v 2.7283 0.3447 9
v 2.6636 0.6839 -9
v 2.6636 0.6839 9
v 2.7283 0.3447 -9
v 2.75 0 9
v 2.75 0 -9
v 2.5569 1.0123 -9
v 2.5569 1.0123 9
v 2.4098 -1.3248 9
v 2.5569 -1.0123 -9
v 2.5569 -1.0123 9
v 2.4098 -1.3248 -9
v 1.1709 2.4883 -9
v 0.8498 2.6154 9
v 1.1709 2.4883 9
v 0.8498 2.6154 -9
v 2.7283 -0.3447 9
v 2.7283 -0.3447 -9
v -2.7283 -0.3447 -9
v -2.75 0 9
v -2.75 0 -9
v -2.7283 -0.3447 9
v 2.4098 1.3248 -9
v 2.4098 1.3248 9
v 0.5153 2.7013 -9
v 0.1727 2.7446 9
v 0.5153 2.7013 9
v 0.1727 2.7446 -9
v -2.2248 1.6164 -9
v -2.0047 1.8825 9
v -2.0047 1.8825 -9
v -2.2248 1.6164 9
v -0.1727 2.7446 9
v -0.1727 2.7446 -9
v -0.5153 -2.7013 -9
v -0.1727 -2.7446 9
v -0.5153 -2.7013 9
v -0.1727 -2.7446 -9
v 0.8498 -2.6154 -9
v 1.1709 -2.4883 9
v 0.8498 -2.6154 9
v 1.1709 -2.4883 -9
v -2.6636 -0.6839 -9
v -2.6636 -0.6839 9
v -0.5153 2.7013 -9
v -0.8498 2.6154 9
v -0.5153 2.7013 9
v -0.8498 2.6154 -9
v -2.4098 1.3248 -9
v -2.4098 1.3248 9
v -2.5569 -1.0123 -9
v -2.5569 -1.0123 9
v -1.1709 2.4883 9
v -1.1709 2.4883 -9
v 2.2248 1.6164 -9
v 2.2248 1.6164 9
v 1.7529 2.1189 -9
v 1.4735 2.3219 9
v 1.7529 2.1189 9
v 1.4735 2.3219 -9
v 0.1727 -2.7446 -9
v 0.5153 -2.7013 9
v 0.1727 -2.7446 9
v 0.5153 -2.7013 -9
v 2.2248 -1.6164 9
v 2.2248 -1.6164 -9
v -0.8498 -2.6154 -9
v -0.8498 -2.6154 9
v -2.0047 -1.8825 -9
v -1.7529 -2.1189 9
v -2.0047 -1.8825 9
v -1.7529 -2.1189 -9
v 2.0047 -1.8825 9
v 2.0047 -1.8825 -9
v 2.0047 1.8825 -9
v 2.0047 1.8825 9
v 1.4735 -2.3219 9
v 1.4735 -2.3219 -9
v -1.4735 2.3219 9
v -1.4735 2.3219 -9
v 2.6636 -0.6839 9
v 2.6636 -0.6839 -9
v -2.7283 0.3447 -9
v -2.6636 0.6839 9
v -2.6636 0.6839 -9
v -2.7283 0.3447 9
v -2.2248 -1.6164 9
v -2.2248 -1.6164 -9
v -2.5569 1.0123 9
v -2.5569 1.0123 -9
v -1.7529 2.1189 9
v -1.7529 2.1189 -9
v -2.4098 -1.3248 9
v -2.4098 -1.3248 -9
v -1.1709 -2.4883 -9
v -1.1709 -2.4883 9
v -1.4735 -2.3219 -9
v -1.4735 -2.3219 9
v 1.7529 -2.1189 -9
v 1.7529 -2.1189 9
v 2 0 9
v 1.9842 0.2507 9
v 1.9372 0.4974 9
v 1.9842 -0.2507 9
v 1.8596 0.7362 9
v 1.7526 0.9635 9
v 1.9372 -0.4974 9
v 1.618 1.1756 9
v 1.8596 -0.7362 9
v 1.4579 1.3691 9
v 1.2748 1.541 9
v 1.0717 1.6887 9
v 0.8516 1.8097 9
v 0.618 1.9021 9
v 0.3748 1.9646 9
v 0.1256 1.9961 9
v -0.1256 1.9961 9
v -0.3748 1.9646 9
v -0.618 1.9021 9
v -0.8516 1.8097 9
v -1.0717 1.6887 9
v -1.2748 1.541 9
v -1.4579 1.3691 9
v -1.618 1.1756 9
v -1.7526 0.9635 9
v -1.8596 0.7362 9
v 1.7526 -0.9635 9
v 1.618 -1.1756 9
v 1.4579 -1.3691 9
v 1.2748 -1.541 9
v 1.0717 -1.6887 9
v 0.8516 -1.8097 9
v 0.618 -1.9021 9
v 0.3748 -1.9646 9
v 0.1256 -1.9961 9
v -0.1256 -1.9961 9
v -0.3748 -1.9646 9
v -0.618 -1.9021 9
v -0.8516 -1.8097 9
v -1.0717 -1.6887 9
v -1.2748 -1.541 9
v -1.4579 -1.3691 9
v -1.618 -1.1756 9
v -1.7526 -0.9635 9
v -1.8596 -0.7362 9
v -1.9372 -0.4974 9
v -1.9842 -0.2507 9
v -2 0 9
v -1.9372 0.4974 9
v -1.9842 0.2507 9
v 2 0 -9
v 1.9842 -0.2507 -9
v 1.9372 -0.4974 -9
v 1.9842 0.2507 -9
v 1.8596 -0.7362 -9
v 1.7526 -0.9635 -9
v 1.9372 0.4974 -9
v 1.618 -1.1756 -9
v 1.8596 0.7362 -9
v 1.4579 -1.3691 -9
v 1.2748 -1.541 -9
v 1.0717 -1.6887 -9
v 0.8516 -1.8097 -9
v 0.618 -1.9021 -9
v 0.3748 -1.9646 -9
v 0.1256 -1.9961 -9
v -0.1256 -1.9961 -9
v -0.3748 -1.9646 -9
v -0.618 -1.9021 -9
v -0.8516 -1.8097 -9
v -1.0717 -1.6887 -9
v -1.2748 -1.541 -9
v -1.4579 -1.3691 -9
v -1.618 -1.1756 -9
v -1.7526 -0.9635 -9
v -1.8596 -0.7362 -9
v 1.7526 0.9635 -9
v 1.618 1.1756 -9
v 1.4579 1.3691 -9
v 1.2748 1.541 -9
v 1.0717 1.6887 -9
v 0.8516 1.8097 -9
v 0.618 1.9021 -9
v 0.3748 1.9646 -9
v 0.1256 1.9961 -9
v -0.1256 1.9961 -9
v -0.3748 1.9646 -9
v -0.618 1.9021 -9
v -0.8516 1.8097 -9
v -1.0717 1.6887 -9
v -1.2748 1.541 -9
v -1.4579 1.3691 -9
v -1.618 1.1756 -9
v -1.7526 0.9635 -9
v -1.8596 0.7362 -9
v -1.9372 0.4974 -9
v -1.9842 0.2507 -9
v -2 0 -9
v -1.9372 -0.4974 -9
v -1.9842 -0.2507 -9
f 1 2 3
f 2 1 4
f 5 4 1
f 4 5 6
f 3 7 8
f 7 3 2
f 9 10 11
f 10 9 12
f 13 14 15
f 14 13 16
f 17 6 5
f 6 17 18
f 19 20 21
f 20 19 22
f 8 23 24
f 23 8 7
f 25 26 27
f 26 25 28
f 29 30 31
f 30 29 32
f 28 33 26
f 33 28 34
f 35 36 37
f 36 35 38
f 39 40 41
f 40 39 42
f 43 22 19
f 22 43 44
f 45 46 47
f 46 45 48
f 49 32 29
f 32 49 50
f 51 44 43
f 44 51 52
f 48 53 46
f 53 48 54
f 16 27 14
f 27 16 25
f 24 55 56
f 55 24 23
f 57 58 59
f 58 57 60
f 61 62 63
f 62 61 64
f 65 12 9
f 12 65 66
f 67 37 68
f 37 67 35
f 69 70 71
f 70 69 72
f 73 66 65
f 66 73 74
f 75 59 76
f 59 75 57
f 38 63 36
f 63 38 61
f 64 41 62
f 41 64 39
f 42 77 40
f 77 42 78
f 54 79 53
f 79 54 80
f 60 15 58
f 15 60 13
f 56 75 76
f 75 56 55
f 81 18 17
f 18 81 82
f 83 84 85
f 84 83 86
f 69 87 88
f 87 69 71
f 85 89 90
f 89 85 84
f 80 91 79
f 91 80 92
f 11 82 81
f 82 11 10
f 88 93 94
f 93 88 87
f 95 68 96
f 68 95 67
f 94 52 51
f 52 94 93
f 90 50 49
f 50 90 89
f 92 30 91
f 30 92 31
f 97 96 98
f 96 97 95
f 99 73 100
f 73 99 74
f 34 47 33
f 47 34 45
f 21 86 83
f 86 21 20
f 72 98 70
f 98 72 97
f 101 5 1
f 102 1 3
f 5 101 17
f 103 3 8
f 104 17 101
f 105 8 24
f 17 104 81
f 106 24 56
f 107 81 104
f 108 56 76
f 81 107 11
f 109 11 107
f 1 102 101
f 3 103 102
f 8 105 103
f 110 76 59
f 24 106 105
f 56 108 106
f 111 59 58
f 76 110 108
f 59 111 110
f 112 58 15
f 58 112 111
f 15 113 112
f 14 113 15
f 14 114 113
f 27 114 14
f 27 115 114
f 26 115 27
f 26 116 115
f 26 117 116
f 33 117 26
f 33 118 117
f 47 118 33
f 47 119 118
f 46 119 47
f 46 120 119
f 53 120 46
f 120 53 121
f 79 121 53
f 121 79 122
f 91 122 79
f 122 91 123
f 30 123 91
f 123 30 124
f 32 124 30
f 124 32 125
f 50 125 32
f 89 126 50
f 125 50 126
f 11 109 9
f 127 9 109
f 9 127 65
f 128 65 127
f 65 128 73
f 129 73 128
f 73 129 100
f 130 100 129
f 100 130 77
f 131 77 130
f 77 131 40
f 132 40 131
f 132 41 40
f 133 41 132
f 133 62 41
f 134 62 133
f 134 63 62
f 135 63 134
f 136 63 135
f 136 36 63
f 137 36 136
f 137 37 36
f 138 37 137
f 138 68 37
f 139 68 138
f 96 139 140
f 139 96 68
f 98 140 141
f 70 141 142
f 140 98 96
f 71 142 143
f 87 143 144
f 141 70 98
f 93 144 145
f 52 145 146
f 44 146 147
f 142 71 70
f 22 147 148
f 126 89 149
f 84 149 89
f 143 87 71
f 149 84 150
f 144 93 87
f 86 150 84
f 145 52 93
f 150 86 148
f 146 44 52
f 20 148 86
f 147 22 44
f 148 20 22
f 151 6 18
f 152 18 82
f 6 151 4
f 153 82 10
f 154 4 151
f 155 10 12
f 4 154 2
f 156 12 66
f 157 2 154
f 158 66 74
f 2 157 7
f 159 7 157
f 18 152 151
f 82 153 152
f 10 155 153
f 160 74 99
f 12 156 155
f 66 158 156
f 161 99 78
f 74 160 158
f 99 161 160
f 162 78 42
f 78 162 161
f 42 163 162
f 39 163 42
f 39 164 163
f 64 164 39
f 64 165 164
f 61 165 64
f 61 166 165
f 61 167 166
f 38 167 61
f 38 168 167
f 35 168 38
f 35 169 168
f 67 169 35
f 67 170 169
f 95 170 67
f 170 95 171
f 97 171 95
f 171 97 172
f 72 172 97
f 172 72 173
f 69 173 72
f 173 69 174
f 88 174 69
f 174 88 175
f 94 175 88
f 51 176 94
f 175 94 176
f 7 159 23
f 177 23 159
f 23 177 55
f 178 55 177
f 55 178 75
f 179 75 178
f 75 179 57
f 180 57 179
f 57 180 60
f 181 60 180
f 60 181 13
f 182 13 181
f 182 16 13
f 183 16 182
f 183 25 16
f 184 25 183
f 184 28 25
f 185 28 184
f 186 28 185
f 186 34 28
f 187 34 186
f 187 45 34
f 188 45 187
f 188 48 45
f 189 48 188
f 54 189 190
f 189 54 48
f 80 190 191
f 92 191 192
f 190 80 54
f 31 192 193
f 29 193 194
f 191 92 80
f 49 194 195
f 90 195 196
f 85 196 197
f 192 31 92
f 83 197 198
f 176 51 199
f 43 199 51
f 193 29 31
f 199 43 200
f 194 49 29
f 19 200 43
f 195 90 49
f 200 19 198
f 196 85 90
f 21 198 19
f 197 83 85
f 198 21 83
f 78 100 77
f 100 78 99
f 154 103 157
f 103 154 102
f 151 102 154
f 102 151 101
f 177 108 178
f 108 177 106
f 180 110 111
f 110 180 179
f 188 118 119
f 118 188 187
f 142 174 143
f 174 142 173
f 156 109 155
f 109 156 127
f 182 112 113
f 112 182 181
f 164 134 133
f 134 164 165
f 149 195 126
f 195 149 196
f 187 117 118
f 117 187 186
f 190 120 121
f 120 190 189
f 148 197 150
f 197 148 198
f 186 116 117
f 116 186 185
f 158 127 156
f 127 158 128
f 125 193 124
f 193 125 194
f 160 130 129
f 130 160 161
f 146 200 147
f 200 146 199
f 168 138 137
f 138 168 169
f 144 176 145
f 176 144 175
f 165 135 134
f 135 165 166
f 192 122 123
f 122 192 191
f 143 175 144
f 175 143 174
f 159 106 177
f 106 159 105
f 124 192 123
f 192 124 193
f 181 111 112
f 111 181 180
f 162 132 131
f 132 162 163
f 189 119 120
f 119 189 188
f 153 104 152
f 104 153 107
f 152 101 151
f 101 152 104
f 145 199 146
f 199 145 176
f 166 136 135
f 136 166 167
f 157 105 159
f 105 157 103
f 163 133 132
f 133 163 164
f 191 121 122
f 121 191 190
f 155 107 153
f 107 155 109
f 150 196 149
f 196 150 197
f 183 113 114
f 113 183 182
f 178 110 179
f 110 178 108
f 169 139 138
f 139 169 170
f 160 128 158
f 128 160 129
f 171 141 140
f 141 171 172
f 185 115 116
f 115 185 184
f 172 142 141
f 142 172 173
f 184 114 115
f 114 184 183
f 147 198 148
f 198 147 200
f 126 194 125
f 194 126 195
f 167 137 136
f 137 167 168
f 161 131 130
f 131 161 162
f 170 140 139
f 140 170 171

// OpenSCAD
$fn = 50;


difference() {
	union() {
		translate(v = [0, 0, -9.0000000000]) {
			cylinder(h = 18, r = 2.7500000000);
		}
	}
	union() {
		translate(v = [0, 0, -100.0000000000]) {
			cylinder(h = 200, r = 2.0000000000);
		}
	}
}
